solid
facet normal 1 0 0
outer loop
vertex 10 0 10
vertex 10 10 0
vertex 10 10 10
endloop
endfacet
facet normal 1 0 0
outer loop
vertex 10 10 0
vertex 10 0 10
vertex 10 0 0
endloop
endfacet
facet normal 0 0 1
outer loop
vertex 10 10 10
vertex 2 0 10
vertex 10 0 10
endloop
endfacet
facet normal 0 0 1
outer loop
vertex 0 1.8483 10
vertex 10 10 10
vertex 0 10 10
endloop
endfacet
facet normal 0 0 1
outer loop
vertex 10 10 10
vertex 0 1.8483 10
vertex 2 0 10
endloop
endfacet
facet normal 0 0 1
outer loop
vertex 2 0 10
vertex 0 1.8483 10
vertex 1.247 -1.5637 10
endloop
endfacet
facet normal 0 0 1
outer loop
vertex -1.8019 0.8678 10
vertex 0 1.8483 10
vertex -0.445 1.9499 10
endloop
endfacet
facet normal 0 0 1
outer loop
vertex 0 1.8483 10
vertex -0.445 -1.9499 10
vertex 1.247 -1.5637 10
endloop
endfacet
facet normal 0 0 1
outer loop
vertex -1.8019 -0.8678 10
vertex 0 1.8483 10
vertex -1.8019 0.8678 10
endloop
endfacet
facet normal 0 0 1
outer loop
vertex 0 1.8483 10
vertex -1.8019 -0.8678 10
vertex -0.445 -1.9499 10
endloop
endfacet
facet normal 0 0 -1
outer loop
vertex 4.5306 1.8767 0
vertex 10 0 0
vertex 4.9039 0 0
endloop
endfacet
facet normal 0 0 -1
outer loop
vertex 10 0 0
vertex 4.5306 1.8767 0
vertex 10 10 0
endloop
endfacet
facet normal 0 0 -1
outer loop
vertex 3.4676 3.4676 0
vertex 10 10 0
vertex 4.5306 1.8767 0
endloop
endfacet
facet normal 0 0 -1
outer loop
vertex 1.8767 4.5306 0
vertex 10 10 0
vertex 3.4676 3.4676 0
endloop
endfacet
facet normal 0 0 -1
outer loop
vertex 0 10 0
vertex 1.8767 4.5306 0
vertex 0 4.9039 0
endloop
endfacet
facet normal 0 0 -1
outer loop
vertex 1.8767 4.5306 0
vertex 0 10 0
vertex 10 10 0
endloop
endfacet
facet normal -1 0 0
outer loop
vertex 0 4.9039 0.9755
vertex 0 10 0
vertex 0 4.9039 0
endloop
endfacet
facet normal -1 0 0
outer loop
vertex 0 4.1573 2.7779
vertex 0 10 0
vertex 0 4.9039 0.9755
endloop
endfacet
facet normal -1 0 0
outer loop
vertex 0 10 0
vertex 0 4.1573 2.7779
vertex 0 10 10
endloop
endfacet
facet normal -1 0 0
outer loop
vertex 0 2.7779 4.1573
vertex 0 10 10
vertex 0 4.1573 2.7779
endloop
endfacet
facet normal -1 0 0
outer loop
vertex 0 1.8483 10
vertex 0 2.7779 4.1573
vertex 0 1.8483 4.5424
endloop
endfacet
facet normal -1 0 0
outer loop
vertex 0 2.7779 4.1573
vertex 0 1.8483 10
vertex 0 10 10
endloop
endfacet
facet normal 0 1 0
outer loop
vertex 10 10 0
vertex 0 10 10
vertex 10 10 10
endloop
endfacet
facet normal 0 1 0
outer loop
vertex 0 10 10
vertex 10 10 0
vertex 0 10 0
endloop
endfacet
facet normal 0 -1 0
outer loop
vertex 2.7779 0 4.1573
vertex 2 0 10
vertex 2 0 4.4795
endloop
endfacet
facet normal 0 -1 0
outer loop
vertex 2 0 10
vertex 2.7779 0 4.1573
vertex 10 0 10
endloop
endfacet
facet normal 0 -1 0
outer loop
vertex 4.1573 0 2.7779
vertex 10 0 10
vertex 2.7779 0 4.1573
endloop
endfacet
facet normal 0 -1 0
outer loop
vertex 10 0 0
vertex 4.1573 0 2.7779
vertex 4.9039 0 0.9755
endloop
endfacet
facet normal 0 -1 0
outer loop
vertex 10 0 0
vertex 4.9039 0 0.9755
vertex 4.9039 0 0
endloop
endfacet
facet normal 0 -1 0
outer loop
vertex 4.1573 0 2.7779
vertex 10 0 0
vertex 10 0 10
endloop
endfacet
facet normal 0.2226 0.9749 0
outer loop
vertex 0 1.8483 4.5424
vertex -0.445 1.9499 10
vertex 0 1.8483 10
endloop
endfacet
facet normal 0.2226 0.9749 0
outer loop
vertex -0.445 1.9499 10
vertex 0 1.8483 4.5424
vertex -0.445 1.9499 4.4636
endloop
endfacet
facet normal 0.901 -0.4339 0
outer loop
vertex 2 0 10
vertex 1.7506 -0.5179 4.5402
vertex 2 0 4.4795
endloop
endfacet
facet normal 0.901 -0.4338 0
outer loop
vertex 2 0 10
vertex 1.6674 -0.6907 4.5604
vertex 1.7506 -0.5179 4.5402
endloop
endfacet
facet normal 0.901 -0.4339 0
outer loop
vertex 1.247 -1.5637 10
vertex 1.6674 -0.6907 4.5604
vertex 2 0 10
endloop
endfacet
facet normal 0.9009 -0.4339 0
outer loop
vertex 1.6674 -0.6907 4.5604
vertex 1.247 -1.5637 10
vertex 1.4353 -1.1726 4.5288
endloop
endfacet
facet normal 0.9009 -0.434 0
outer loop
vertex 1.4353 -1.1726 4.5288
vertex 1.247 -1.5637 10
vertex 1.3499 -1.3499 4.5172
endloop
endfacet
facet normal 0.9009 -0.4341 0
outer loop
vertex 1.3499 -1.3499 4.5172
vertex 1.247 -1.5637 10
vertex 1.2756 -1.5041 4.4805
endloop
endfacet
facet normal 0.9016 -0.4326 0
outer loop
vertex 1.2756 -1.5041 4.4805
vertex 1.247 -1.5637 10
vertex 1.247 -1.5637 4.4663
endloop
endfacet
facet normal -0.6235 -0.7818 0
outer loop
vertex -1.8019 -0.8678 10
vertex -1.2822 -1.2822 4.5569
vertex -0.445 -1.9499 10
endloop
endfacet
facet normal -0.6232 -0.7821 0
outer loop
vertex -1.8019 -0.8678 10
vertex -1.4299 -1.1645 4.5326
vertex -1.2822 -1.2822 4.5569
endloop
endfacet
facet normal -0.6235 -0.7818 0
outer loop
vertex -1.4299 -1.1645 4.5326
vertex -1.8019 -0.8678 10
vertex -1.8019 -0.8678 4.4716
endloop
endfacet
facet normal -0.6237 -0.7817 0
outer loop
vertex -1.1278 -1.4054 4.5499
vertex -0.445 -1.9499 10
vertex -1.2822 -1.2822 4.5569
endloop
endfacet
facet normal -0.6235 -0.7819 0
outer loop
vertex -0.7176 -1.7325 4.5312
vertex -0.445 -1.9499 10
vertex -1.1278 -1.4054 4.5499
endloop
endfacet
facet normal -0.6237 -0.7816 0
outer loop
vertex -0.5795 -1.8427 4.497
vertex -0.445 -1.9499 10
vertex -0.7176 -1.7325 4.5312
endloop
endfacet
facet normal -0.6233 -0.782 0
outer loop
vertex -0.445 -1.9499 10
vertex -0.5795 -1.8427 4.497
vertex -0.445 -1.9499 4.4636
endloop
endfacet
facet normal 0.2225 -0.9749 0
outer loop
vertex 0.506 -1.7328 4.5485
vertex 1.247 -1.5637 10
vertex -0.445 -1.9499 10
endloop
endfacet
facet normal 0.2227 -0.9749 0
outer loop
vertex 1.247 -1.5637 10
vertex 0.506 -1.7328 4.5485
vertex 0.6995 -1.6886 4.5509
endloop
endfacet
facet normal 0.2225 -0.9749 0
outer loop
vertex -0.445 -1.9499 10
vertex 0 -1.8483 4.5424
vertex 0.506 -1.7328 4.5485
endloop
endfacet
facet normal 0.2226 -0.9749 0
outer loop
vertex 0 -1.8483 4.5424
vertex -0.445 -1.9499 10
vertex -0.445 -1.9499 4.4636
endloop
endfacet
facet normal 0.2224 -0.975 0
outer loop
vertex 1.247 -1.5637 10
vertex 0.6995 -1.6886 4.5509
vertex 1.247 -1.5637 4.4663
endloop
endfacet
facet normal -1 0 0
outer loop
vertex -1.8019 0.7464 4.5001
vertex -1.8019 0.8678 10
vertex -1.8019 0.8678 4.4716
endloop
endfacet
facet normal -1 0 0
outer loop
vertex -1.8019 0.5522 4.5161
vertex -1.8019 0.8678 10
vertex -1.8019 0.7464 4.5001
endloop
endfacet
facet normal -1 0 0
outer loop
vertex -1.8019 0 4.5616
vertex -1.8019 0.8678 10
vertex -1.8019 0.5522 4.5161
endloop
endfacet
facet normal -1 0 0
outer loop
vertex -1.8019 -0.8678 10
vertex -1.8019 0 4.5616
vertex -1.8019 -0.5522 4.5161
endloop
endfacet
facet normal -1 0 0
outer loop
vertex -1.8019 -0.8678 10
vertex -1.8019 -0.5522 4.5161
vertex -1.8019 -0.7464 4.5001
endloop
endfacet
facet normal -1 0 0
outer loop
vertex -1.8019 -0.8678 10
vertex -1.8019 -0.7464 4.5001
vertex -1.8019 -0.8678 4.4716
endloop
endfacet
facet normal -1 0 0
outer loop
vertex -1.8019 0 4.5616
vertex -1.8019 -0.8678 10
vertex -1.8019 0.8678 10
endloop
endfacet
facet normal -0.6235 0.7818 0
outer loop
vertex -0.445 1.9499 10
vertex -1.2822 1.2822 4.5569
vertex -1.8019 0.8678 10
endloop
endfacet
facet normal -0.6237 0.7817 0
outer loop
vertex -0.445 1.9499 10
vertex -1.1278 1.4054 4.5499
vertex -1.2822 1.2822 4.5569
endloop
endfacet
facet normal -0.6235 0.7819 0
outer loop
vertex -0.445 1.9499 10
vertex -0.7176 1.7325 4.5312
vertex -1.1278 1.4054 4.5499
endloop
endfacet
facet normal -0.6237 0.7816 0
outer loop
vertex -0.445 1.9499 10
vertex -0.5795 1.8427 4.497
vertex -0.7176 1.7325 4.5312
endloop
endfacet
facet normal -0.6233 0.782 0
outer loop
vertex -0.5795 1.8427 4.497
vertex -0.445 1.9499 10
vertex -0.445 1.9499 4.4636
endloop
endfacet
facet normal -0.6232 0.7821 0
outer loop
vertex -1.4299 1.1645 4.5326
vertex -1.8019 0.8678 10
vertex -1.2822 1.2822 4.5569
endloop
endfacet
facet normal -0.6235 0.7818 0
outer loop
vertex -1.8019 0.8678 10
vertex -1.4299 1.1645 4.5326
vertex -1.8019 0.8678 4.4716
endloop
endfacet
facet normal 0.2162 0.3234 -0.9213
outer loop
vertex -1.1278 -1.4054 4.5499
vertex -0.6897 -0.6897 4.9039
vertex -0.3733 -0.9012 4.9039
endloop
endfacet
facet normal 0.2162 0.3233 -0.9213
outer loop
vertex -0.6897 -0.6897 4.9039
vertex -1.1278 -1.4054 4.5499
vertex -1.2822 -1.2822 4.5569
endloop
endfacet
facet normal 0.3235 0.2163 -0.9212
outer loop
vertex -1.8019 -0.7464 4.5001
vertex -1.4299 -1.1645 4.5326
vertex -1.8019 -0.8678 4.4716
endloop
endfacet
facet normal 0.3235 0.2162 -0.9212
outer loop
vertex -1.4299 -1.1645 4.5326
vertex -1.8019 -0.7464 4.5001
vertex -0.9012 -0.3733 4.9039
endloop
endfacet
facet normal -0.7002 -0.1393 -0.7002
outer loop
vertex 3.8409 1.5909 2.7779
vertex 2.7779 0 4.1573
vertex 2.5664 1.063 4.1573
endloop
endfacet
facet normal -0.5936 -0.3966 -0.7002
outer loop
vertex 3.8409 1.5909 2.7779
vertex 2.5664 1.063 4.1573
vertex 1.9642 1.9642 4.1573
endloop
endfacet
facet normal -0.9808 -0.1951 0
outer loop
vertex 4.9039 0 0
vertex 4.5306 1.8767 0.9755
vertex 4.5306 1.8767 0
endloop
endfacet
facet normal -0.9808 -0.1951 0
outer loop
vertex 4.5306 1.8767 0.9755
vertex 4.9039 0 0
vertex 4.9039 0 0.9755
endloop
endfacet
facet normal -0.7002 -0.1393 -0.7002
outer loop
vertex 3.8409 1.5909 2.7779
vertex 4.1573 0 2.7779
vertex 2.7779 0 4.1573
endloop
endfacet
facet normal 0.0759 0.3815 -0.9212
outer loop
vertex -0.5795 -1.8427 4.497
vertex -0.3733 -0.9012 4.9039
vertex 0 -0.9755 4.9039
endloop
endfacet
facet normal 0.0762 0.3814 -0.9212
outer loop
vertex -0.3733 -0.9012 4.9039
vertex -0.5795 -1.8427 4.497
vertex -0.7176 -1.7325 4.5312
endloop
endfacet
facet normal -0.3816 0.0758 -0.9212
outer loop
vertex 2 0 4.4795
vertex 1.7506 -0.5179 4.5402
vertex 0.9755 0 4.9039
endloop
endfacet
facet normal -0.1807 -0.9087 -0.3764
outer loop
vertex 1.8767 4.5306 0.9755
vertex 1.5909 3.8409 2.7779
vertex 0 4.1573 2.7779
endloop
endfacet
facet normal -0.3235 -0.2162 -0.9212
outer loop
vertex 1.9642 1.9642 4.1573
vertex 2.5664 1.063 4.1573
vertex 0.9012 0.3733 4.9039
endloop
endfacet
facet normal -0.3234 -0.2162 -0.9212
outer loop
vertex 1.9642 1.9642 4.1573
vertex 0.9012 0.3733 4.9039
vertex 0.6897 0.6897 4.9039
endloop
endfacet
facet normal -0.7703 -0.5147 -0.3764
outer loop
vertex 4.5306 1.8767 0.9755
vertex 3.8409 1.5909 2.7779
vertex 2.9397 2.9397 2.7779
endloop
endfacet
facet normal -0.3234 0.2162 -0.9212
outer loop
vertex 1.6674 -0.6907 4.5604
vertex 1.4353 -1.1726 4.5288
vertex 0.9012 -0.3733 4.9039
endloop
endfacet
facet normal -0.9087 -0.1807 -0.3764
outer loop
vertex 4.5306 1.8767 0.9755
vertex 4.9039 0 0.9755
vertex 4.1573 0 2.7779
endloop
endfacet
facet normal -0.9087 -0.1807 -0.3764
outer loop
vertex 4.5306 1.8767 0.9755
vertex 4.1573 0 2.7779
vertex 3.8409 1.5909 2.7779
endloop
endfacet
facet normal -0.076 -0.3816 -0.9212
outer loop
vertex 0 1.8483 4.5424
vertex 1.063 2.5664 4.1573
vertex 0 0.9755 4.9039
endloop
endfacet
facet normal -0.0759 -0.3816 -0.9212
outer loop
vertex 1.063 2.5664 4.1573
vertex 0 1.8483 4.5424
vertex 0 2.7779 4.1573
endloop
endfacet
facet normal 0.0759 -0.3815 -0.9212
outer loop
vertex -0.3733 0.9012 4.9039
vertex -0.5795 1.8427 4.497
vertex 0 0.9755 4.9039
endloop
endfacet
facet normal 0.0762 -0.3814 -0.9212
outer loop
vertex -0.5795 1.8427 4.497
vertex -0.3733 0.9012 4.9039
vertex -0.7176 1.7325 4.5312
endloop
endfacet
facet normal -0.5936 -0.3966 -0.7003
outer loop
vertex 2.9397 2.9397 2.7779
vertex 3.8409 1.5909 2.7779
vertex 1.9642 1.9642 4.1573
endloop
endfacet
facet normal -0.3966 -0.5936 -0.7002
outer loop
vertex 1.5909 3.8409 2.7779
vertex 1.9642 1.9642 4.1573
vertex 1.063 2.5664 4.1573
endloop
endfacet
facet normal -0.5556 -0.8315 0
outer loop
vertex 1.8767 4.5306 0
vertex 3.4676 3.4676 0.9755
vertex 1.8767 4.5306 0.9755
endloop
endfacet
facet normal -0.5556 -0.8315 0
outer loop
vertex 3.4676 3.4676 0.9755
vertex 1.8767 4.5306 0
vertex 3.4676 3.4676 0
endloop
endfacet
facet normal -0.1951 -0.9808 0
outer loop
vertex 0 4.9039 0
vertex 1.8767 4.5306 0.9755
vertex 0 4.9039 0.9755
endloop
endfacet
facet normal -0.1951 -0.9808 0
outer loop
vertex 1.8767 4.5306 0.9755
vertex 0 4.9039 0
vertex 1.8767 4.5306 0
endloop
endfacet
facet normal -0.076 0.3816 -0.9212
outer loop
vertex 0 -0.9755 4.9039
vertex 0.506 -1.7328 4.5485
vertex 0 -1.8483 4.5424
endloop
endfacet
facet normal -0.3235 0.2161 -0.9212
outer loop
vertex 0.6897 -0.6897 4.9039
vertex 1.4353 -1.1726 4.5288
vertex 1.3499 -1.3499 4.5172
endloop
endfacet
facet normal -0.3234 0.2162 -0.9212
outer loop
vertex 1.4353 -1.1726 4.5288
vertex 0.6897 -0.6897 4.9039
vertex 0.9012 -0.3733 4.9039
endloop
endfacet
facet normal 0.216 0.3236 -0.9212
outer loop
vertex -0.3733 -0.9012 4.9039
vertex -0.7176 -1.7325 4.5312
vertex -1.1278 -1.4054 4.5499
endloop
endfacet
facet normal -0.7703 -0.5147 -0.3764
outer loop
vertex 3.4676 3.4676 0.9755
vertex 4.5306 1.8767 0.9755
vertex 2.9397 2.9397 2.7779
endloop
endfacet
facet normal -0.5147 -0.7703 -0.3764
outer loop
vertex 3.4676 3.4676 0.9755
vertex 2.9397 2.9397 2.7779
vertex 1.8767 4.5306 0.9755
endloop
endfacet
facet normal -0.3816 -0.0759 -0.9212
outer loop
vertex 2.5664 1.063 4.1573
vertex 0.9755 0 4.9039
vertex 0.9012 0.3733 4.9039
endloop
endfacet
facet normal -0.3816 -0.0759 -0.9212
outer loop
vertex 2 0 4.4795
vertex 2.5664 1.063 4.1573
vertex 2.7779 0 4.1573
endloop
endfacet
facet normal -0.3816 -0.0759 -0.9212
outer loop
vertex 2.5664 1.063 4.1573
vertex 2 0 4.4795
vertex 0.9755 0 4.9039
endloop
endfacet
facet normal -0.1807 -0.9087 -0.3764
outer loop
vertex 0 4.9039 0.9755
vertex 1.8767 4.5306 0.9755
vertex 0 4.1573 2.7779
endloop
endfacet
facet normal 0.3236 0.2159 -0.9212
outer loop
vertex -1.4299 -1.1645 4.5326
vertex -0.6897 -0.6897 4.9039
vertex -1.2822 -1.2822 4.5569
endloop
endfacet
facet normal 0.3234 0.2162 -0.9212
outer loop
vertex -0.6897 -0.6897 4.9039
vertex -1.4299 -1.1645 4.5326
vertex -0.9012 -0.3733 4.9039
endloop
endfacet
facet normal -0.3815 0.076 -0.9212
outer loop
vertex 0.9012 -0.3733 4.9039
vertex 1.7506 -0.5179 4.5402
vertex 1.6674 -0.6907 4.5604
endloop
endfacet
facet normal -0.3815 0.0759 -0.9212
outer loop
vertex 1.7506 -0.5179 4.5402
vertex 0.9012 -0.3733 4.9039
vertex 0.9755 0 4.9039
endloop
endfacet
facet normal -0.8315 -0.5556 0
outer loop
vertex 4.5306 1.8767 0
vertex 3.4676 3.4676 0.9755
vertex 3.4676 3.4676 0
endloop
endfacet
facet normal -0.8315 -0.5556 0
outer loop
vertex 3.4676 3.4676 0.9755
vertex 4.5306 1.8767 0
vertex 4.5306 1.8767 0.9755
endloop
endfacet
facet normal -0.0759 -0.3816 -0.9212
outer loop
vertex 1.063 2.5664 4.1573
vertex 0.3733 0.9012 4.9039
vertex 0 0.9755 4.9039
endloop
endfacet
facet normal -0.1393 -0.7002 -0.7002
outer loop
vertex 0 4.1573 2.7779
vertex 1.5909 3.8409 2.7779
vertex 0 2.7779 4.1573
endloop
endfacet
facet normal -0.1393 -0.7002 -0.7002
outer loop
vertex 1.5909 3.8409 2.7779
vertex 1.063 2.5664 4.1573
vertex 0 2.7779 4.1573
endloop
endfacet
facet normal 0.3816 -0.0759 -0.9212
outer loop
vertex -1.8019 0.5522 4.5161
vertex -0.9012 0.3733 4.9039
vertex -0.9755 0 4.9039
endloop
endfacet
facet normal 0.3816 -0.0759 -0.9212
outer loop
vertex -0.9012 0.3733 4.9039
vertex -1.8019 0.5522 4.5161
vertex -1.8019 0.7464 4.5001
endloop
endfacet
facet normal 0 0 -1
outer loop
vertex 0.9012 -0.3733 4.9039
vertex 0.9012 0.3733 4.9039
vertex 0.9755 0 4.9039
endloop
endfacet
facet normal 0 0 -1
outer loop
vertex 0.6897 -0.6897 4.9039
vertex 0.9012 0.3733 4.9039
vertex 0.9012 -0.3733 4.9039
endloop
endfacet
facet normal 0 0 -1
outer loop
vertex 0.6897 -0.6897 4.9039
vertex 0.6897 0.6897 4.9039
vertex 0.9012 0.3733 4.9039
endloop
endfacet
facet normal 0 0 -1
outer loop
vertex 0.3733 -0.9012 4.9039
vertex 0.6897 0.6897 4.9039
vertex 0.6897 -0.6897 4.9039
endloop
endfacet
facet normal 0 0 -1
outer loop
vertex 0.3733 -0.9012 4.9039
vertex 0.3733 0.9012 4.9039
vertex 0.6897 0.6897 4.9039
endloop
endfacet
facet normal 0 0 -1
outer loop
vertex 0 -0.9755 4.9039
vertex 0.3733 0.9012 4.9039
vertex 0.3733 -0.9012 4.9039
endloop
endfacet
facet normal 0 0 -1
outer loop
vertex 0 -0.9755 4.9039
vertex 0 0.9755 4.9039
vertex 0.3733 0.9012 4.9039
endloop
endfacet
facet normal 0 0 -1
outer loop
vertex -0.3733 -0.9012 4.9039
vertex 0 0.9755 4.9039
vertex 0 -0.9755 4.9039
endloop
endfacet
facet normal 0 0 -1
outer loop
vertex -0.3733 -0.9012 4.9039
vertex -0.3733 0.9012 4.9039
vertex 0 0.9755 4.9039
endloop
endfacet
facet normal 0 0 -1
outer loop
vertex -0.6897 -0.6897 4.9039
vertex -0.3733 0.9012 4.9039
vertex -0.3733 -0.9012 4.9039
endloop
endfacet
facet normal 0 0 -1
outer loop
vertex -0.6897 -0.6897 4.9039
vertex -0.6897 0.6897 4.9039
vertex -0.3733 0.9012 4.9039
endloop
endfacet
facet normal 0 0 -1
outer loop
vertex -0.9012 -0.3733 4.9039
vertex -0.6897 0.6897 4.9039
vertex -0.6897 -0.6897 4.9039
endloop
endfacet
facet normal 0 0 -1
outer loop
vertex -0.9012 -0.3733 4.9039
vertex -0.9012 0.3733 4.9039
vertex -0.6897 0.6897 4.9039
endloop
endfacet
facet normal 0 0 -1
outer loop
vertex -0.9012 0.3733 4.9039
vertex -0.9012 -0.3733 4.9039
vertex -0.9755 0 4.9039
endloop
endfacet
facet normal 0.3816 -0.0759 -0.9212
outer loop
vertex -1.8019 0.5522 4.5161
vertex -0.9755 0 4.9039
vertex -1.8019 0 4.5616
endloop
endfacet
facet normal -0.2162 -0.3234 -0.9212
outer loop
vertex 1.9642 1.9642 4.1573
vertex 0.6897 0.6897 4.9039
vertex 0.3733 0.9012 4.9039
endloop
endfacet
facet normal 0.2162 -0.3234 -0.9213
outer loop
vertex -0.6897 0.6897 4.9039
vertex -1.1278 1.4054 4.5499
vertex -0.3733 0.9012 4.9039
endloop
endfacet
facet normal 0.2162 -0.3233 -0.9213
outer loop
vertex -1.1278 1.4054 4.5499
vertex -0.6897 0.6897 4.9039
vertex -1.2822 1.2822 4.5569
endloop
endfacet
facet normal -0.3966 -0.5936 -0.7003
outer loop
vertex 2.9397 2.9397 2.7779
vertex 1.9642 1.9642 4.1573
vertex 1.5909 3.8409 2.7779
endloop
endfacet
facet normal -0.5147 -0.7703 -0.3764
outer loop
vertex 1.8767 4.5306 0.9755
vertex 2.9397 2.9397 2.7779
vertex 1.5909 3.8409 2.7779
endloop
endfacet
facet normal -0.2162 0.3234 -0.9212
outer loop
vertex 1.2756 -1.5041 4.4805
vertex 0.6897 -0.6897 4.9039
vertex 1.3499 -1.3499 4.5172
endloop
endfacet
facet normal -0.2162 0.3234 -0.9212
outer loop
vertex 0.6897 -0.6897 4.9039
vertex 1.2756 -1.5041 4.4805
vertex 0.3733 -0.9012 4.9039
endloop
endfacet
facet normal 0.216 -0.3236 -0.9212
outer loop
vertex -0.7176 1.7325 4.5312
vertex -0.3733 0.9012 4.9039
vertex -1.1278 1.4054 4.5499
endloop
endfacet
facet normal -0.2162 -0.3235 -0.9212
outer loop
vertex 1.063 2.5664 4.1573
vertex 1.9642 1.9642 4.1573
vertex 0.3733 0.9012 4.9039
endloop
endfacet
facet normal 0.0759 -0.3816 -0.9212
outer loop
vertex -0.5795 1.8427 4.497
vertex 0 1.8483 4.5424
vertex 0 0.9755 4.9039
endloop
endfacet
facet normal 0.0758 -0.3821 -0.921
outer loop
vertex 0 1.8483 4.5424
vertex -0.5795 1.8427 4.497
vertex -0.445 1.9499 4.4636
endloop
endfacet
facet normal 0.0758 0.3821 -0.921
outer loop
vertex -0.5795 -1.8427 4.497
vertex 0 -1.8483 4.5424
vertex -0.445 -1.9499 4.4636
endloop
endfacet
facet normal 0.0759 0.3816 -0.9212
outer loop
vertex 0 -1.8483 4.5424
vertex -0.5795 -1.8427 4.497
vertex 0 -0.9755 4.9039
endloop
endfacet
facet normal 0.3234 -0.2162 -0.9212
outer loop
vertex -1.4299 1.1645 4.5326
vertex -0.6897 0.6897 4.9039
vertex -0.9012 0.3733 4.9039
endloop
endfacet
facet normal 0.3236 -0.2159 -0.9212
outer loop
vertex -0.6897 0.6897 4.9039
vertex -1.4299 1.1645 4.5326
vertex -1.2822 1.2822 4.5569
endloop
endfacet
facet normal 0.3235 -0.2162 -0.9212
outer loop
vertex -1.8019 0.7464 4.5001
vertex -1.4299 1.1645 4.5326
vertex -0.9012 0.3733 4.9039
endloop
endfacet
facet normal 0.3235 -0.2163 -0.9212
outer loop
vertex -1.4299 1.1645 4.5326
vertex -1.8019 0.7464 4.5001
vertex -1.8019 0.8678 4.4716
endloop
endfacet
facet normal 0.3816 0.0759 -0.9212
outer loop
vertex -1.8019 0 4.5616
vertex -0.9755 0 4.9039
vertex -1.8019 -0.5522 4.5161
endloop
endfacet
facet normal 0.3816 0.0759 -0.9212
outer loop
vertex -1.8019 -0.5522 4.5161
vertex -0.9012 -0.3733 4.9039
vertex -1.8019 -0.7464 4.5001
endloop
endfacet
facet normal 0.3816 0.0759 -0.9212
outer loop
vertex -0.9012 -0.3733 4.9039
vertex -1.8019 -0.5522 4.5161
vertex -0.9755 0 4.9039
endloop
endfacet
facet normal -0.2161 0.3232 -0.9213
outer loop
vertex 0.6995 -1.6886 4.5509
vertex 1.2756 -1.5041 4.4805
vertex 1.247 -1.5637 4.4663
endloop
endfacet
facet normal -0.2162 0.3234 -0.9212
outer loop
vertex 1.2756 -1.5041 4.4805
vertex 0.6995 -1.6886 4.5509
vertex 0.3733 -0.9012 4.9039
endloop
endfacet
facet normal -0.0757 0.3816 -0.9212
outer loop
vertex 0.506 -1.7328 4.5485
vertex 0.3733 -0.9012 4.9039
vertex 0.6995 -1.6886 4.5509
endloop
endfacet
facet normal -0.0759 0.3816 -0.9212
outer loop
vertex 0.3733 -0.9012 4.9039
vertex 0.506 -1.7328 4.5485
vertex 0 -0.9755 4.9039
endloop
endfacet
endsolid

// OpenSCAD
difference(){
    union(){
      cube([10, 10, 10]);
      cylinder(r=2, h=10);
    }
    sphere(5);
}
